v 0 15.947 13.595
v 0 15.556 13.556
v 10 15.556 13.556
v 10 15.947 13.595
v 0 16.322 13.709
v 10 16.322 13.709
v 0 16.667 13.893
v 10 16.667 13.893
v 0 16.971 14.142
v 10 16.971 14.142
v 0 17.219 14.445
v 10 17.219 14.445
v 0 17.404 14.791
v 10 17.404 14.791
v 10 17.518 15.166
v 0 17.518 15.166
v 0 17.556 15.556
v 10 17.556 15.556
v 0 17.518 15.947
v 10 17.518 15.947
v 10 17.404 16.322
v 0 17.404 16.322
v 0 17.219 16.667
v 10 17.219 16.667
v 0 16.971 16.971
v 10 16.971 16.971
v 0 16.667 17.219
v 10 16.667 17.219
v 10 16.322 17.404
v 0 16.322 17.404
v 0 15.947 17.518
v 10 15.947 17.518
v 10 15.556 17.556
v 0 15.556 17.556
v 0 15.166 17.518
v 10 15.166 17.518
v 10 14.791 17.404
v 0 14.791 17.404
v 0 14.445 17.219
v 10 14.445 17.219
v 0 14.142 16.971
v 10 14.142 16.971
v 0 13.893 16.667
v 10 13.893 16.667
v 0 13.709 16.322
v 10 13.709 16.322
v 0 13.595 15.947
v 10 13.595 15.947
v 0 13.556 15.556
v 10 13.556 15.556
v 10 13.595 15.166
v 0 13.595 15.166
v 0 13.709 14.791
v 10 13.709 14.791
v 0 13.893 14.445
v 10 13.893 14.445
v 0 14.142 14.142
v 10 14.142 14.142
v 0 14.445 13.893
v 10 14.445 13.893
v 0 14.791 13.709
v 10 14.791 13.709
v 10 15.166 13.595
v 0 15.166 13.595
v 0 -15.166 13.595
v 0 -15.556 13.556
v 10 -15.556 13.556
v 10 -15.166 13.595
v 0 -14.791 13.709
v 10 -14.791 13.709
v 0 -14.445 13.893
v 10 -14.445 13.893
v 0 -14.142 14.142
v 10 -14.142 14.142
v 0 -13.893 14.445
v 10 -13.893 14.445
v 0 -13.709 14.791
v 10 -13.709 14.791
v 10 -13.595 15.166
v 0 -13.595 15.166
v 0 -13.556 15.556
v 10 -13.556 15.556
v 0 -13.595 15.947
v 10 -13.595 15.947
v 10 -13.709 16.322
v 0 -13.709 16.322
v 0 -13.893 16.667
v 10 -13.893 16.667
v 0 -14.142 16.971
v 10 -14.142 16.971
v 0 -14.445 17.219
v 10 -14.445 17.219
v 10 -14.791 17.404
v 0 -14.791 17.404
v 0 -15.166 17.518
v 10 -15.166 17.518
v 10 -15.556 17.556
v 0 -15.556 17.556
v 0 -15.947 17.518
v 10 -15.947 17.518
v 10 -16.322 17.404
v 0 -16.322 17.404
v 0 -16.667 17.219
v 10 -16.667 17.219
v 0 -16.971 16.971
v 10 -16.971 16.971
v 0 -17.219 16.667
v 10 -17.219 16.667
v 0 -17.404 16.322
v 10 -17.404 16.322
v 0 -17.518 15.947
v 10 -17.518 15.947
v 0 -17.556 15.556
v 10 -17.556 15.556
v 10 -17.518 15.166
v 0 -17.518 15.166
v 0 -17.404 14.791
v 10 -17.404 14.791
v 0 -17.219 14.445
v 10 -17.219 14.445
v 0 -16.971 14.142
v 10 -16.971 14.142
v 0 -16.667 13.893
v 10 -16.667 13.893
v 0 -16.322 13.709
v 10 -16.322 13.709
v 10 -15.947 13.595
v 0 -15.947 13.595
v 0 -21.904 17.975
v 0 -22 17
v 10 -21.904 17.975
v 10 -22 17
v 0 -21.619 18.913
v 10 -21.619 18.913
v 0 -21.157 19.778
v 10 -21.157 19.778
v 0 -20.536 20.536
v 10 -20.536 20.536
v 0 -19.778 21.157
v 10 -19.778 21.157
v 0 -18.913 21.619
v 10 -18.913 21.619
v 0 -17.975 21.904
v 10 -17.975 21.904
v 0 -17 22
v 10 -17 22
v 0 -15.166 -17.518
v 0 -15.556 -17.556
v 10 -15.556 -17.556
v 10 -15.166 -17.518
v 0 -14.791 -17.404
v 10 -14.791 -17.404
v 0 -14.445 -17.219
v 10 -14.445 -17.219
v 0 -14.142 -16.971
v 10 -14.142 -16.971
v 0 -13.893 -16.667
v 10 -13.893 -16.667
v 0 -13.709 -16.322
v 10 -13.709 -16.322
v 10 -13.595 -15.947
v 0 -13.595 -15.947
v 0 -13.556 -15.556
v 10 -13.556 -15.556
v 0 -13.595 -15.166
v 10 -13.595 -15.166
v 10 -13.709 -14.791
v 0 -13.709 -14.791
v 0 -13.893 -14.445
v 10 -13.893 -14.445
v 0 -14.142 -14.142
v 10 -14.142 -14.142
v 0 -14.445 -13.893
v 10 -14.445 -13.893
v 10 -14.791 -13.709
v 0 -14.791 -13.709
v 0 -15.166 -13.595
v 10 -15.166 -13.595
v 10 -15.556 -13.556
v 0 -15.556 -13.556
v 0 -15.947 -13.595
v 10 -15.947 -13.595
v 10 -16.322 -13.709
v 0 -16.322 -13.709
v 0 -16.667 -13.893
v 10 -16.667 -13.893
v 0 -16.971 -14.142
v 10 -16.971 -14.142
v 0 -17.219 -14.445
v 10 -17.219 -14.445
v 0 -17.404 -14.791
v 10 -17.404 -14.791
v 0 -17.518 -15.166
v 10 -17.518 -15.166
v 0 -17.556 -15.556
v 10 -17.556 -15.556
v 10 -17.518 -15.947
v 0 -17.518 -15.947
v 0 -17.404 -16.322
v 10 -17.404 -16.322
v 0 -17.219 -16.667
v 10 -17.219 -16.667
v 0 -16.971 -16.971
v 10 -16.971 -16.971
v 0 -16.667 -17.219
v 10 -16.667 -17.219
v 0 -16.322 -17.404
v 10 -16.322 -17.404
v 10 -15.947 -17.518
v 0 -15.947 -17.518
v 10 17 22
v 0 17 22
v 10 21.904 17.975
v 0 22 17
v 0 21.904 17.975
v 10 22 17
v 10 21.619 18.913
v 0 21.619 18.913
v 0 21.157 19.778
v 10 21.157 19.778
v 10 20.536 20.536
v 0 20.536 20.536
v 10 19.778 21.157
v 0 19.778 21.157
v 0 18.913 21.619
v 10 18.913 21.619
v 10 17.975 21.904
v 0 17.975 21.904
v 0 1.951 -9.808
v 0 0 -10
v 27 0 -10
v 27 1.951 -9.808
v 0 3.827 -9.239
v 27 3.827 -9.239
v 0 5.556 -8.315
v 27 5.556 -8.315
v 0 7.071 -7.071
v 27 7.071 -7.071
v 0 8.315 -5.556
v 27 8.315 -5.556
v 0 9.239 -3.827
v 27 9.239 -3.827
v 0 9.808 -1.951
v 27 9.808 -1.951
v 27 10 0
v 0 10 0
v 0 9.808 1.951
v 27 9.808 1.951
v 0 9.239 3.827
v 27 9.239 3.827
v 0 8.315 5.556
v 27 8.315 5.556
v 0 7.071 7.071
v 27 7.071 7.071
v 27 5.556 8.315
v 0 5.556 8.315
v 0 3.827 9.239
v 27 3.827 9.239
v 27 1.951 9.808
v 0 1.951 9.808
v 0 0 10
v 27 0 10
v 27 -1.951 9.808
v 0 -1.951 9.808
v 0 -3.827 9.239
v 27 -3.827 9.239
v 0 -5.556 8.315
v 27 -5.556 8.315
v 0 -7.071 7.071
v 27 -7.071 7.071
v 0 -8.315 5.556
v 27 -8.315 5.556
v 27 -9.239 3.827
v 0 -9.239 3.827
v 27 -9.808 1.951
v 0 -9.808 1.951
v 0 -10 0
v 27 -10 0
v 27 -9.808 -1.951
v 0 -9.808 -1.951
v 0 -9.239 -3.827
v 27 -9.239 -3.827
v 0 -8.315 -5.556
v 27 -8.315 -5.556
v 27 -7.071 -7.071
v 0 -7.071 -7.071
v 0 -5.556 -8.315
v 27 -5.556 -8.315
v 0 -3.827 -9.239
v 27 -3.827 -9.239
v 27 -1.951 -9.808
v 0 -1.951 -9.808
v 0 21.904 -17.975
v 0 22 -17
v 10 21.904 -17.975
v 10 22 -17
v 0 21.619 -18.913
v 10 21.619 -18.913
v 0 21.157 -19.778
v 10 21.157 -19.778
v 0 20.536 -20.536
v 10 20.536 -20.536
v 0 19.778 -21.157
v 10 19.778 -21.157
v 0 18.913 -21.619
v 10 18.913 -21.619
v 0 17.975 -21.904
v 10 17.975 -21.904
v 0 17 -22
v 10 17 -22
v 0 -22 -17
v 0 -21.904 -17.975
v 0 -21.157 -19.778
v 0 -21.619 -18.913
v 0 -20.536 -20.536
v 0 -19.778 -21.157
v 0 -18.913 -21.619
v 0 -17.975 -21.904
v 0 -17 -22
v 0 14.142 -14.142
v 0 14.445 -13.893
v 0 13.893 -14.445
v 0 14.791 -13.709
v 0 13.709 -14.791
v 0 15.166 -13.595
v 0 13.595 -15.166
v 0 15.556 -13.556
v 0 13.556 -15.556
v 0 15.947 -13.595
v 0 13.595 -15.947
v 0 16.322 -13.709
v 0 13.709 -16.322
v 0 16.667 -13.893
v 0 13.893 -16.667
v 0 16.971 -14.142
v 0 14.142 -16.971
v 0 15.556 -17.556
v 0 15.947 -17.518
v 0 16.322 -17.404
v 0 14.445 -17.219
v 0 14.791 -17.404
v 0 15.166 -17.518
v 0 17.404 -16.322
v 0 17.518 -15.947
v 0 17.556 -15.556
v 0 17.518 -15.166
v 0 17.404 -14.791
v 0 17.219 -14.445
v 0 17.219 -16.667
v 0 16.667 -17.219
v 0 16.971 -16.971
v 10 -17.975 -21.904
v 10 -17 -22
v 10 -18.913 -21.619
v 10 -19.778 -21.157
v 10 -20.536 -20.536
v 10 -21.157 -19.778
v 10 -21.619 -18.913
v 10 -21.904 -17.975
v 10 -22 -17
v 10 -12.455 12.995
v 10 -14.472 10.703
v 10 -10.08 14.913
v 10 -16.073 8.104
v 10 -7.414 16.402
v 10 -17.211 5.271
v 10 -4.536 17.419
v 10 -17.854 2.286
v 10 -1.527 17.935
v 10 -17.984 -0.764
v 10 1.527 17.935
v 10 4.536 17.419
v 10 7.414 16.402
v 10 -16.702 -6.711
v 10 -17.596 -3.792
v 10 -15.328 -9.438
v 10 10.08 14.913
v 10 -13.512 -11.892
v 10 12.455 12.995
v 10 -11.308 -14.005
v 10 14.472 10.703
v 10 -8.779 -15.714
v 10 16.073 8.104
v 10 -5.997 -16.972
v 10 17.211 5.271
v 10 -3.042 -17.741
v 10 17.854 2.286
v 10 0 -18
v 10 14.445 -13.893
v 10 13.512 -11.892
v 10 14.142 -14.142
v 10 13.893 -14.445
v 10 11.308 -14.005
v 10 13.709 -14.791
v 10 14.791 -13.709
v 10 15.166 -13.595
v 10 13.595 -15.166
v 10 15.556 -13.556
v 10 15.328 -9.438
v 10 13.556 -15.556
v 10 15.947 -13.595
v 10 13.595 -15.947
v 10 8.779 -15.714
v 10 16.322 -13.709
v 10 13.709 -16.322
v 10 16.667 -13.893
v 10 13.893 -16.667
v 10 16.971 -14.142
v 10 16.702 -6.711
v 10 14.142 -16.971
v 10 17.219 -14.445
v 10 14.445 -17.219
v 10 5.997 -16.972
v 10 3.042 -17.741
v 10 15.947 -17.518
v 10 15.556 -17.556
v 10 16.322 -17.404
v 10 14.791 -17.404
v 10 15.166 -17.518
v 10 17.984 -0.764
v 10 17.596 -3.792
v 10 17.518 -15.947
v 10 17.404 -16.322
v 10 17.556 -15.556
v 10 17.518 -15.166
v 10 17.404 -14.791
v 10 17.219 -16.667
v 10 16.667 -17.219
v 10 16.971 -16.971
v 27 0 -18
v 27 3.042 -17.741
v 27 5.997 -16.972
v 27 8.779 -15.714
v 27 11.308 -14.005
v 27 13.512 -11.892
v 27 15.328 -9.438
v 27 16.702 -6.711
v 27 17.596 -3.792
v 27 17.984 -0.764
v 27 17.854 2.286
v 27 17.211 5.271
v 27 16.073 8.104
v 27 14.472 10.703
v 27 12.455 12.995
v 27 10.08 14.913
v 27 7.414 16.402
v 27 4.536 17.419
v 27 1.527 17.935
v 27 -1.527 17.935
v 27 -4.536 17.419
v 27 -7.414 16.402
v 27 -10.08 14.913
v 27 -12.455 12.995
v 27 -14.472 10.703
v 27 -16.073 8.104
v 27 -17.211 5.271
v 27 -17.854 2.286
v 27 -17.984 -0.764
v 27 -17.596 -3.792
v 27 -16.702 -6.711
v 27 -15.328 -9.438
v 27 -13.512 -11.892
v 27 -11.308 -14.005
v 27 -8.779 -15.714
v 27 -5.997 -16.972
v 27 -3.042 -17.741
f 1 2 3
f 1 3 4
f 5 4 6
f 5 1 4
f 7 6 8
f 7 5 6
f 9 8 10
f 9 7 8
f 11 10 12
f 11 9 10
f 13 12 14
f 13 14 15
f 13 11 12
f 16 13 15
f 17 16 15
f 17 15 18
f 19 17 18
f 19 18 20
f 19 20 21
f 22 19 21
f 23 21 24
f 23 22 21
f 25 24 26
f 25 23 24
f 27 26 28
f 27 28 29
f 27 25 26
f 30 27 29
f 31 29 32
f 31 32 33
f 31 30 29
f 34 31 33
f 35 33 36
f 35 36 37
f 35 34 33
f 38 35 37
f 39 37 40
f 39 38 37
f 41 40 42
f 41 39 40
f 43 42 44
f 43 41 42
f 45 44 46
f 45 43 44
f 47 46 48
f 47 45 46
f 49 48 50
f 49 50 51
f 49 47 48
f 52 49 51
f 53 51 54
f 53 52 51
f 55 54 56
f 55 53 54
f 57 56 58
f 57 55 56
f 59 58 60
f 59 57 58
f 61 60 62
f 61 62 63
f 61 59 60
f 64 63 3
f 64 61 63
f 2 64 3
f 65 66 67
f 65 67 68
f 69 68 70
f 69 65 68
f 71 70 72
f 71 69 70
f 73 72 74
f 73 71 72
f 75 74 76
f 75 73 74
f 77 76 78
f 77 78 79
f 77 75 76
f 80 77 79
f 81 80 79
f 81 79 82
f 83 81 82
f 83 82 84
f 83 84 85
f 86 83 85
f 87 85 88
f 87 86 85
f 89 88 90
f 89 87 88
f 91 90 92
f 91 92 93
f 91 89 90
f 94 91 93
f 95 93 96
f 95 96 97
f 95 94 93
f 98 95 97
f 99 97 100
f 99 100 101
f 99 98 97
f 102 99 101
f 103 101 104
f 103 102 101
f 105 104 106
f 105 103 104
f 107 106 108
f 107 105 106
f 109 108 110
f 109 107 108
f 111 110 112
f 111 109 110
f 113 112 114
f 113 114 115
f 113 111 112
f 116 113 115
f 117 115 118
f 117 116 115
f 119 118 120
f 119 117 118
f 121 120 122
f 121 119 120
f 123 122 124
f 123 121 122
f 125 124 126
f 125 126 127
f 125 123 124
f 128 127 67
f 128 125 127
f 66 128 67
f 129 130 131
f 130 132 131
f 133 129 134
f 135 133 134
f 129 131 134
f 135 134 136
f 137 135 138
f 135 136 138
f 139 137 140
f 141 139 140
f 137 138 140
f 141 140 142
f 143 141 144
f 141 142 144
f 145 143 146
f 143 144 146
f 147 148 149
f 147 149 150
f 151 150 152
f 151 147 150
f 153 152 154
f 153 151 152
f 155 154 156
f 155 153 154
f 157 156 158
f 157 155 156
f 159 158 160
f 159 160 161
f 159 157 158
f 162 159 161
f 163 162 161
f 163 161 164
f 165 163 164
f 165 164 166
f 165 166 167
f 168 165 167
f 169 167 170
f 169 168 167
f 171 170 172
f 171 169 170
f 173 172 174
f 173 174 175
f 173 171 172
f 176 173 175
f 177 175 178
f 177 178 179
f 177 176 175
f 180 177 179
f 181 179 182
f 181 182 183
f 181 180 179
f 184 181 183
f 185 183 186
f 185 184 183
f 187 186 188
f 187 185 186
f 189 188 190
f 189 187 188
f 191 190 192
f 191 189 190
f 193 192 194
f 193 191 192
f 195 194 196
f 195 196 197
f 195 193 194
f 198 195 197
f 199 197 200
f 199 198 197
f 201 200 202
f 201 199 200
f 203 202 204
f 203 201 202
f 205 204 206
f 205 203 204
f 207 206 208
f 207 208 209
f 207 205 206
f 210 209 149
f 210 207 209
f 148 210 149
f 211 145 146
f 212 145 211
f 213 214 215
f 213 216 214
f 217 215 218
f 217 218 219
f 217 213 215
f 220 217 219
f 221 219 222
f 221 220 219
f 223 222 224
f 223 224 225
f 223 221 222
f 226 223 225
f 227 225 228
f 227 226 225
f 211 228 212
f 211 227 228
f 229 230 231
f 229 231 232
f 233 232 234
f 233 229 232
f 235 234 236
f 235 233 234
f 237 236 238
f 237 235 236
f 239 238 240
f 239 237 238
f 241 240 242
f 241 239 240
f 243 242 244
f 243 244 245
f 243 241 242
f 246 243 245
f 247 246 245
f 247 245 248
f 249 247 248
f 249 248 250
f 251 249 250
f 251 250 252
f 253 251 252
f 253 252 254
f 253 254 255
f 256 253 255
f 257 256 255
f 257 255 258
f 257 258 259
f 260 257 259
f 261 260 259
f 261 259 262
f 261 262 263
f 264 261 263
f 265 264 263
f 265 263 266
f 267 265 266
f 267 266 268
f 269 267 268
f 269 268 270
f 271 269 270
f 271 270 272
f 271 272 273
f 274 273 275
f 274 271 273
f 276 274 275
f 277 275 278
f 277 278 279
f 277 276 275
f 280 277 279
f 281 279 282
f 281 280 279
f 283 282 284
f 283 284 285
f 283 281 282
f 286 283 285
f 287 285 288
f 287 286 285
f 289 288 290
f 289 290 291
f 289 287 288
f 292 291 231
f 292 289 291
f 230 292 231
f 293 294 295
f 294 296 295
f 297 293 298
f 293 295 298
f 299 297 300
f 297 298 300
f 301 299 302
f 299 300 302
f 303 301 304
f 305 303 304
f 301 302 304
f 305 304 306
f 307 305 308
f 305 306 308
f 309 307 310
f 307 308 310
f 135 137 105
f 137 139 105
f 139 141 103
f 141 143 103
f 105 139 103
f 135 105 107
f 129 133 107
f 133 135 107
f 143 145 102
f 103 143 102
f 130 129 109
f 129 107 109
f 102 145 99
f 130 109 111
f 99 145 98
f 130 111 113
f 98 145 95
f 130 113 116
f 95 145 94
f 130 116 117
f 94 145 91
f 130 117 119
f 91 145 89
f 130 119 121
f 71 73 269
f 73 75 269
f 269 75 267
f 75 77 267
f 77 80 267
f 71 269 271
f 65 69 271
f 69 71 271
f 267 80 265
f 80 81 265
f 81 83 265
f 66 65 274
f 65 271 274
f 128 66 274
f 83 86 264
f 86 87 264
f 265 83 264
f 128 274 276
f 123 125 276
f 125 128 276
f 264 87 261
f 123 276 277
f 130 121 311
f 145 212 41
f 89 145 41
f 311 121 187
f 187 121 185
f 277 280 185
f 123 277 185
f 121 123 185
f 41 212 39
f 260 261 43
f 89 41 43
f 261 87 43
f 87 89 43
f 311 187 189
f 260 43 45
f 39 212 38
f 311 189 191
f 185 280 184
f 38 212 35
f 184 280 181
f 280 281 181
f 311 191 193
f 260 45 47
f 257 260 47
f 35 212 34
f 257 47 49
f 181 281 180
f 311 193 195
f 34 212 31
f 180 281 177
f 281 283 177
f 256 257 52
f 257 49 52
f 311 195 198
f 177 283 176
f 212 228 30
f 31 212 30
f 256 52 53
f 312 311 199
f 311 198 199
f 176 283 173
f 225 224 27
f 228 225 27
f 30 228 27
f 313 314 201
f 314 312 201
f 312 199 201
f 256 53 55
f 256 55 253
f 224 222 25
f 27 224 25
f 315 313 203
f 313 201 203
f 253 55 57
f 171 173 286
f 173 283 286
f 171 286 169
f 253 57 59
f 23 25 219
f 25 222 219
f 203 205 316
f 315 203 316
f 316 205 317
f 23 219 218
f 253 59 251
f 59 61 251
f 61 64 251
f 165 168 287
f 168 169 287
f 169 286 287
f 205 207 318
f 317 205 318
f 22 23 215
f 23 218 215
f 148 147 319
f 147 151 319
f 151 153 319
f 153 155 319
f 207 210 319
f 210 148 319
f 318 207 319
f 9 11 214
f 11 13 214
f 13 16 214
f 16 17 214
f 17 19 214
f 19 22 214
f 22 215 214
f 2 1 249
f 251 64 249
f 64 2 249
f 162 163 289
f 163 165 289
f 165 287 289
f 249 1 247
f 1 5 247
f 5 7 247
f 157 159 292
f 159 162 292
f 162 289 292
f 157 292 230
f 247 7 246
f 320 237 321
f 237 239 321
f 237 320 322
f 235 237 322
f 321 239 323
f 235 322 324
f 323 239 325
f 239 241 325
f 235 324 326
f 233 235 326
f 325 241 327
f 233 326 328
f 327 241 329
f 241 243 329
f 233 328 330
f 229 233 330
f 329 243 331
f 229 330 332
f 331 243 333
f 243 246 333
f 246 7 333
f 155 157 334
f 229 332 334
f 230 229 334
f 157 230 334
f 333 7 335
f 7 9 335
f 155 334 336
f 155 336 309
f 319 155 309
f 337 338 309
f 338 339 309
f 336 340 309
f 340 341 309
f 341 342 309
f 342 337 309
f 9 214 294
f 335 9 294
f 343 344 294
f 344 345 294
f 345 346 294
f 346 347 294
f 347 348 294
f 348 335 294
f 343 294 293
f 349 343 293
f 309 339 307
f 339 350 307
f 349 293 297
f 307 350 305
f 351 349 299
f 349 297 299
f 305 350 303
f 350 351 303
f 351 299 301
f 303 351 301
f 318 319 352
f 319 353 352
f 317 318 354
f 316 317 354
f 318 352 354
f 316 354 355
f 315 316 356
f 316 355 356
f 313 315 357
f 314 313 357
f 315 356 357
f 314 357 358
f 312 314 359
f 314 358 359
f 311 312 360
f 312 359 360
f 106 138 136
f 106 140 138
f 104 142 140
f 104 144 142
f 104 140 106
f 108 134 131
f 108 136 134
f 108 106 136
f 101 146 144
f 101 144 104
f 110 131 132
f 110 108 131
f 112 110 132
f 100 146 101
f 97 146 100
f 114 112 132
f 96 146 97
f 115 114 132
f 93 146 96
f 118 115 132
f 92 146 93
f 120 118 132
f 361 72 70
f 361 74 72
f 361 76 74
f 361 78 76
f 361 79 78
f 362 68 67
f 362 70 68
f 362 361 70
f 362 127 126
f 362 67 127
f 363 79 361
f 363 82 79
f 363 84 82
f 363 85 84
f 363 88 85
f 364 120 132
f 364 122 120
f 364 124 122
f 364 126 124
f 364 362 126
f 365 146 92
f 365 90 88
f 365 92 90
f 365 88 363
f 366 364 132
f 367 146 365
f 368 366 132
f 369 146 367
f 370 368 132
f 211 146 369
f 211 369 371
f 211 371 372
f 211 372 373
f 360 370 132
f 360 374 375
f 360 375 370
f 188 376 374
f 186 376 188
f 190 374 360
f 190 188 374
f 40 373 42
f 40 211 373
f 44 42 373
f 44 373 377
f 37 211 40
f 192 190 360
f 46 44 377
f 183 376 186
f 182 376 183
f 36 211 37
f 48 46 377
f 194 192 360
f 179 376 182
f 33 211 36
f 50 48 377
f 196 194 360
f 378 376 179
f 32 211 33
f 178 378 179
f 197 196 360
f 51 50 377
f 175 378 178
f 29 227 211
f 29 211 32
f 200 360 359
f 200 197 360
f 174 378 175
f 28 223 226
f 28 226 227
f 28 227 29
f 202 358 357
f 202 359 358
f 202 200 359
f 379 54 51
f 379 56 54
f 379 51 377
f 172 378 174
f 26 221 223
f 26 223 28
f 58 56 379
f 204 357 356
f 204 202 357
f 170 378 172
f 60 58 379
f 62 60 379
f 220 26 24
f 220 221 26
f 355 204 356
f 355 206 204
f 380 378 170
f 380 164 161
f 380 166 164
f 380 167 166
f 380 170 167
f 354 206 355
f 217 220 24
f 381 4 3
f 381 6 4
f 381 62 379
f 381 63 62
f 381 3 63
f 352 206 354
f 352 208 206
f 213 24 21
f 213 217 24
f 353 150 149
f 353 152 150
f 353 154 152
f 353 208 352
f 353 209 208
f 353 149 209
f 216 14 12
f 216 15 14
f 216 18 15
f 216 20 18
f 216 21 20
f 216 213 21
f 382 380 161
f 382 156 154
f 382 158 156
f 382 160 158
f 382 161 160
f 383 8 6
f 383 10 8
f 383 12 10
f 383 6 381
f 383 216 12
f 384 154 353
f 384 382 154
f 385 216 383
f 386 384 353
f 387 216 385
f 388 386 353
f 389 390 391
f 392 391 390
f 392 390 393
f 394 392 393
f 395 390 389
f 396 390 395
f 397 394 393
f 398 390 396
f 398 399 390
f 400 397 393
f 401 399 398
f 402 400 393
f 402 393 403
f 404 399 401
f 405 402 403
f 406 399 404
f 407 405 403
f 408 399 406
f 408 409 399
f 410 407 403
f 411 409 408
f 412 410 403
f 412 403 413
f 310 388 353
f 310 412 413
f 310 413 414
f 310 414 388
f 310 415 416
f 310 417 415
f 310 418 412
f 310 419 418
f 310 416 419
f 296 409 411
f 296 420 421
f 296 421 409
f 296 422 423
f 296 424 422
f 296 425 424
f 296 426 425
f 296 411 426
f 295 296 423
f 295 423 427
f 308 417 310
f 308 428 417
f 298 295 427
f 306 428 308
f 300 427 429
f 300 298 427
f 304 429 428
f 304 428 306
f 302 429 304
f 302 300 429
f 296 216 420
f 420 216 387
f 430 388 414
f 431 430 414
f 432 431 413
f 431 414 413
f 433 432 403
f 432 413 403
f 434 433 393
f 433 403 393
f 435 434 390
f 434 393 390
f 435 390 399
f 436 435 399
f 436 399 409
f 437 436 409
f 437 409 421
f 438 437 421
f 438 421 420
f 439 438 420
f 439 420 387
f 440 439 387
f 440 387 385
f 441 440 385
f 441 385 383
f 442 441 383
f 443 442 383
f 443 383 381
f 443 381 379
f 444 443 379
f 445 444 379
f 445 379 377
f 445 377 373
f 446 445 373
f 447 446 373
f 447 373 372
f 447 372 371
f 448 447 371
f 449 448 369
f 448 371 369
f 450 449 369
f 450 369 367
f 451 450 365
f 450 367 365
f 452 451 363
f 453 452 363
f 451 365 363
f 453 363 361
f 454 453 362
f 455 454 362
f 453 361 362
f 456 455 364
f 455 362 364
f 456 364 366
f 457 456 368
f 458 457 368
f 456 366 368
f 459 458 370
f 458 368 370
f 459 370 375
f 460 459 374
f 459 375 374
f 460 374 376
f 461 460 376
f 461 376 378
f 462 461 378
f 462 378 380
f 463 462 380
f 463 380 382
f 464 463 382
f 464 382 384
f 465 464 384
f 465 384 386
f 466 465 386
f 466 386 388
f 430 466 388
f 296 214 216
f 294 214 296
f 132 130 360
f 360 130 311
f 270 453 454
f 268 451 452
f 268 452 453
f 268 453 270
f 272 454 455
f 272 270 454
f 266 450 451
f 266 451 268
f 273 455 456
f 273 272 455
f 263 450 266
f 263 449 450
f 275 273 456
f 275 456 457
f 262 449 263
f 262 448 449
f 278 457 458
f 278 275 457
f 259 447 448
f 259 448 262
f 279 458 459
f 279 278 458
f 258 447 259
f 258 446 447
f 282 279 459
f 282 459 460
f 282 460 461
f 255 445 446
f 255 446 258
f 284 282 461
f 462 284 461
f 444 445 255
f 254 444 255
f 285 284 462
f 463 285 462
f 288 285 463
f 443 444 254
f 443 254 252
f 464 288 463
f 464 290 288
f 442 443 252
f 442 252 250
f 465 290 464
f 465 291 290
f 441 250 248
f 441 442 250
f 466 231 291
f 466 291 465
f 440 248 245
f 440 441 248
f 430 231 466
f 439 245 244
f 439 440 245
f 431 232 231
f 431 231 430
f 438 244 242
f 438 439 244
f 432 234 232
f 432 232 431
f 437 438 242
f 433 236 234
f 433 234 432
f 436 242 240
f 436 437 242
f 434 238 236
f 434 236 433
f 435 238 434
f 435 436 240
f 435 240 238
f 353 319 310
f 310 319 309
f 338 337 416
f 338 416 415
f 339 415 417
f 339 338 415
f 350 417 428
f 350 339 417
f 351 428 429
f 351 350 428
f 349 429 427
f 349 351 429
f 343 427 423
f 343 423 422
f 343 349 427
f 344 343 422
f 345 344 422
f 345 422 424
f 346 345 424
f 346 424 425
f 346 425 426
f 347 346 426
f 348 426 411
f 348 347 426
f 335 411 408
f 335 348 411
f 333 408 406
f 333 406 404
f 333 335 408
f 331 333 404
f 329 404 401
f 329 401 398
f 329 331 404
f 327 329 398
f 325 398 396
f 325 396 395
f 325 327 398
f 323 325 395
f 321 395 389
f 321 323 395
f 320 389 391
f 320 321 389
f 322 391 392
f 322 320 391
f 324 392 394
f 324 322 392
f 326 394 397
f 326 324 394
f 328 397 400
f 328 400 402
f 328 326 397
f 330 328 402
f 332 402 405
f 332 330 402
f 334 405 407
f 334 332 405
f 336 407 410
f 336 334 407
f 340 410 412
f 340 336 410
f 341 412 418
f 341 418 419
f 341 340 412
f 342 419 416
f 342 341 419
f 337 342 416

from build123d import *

# Parameters (mm, degrees)
SKETCH1_W           = 44
SKETCH1_H           = 44
SKETCH1_R           = 2
SKETCH1_R_2         = 10
BOSS_EXTRUDE1_DEPTH = 10
SKETCH2_R           = 18
SKETCH2_R_2         = 10
BOSS_EXTRUDE2_DEPTH = 27
FILLET1_R           = 5


with BuildPart() as part:
    # Sketch1 → Boss-Extrude1 (new body)
    with BuildSketch(Plane(origin=(0, 0, 0), x_dir=(0, 0, -1), z_dir=(1, 0, 0))):
        Rectangle(SKETCH1_W, SKETCH1_H)
        with Locations((-15.556349186, 15.556349186)):
            Circle(SKETCH1_R, mode=Mode.SUBTRACT)
        with Locations((15.556349186, 15.556349186)):
            Circle(SKETCH1_R, mode=Mode.SUBTRACT)
        with Locations((15.556349186, -15.556349186)):
            Circle(SKETCH1_R, mode=Mode.SUBTRACT)
        with Locations((-15.556349186, -15.556349186)):
            Circle(SKETCH1_R, mode=Mode.SUBTRACT)
        Circle(SKETCH1_R_2, mode=Mode.SUBTRACT)
    extrude(amount=BOSS_EXTRUDE1_DEPTH)

    # Sketch2 → Boss-Extrude2 (add)
    with BuildSketch(Plane(origin=(0, 0, 0), x_dir=(0, 0, -1), z_dir=(1, 0, 0))):
        Circle(SKETCH2_R)
        Circle(SKETCH2_R_2, mode=Mode.SUBTRACT)
    extrude(amount=BOSS_EXTRUDE2_DEPTH)

    # Fillet1
    fillet1_edges = [part.edges().sort_by_distance(p)[0] for p in [
        (5, 22, 22),
        (5, 22, -22),
        (5, -22, -22),
        (5, -22, 22),
    ]]
    fillet(fillet1_edges, radius=FILLET1_R)


solid = part.part
